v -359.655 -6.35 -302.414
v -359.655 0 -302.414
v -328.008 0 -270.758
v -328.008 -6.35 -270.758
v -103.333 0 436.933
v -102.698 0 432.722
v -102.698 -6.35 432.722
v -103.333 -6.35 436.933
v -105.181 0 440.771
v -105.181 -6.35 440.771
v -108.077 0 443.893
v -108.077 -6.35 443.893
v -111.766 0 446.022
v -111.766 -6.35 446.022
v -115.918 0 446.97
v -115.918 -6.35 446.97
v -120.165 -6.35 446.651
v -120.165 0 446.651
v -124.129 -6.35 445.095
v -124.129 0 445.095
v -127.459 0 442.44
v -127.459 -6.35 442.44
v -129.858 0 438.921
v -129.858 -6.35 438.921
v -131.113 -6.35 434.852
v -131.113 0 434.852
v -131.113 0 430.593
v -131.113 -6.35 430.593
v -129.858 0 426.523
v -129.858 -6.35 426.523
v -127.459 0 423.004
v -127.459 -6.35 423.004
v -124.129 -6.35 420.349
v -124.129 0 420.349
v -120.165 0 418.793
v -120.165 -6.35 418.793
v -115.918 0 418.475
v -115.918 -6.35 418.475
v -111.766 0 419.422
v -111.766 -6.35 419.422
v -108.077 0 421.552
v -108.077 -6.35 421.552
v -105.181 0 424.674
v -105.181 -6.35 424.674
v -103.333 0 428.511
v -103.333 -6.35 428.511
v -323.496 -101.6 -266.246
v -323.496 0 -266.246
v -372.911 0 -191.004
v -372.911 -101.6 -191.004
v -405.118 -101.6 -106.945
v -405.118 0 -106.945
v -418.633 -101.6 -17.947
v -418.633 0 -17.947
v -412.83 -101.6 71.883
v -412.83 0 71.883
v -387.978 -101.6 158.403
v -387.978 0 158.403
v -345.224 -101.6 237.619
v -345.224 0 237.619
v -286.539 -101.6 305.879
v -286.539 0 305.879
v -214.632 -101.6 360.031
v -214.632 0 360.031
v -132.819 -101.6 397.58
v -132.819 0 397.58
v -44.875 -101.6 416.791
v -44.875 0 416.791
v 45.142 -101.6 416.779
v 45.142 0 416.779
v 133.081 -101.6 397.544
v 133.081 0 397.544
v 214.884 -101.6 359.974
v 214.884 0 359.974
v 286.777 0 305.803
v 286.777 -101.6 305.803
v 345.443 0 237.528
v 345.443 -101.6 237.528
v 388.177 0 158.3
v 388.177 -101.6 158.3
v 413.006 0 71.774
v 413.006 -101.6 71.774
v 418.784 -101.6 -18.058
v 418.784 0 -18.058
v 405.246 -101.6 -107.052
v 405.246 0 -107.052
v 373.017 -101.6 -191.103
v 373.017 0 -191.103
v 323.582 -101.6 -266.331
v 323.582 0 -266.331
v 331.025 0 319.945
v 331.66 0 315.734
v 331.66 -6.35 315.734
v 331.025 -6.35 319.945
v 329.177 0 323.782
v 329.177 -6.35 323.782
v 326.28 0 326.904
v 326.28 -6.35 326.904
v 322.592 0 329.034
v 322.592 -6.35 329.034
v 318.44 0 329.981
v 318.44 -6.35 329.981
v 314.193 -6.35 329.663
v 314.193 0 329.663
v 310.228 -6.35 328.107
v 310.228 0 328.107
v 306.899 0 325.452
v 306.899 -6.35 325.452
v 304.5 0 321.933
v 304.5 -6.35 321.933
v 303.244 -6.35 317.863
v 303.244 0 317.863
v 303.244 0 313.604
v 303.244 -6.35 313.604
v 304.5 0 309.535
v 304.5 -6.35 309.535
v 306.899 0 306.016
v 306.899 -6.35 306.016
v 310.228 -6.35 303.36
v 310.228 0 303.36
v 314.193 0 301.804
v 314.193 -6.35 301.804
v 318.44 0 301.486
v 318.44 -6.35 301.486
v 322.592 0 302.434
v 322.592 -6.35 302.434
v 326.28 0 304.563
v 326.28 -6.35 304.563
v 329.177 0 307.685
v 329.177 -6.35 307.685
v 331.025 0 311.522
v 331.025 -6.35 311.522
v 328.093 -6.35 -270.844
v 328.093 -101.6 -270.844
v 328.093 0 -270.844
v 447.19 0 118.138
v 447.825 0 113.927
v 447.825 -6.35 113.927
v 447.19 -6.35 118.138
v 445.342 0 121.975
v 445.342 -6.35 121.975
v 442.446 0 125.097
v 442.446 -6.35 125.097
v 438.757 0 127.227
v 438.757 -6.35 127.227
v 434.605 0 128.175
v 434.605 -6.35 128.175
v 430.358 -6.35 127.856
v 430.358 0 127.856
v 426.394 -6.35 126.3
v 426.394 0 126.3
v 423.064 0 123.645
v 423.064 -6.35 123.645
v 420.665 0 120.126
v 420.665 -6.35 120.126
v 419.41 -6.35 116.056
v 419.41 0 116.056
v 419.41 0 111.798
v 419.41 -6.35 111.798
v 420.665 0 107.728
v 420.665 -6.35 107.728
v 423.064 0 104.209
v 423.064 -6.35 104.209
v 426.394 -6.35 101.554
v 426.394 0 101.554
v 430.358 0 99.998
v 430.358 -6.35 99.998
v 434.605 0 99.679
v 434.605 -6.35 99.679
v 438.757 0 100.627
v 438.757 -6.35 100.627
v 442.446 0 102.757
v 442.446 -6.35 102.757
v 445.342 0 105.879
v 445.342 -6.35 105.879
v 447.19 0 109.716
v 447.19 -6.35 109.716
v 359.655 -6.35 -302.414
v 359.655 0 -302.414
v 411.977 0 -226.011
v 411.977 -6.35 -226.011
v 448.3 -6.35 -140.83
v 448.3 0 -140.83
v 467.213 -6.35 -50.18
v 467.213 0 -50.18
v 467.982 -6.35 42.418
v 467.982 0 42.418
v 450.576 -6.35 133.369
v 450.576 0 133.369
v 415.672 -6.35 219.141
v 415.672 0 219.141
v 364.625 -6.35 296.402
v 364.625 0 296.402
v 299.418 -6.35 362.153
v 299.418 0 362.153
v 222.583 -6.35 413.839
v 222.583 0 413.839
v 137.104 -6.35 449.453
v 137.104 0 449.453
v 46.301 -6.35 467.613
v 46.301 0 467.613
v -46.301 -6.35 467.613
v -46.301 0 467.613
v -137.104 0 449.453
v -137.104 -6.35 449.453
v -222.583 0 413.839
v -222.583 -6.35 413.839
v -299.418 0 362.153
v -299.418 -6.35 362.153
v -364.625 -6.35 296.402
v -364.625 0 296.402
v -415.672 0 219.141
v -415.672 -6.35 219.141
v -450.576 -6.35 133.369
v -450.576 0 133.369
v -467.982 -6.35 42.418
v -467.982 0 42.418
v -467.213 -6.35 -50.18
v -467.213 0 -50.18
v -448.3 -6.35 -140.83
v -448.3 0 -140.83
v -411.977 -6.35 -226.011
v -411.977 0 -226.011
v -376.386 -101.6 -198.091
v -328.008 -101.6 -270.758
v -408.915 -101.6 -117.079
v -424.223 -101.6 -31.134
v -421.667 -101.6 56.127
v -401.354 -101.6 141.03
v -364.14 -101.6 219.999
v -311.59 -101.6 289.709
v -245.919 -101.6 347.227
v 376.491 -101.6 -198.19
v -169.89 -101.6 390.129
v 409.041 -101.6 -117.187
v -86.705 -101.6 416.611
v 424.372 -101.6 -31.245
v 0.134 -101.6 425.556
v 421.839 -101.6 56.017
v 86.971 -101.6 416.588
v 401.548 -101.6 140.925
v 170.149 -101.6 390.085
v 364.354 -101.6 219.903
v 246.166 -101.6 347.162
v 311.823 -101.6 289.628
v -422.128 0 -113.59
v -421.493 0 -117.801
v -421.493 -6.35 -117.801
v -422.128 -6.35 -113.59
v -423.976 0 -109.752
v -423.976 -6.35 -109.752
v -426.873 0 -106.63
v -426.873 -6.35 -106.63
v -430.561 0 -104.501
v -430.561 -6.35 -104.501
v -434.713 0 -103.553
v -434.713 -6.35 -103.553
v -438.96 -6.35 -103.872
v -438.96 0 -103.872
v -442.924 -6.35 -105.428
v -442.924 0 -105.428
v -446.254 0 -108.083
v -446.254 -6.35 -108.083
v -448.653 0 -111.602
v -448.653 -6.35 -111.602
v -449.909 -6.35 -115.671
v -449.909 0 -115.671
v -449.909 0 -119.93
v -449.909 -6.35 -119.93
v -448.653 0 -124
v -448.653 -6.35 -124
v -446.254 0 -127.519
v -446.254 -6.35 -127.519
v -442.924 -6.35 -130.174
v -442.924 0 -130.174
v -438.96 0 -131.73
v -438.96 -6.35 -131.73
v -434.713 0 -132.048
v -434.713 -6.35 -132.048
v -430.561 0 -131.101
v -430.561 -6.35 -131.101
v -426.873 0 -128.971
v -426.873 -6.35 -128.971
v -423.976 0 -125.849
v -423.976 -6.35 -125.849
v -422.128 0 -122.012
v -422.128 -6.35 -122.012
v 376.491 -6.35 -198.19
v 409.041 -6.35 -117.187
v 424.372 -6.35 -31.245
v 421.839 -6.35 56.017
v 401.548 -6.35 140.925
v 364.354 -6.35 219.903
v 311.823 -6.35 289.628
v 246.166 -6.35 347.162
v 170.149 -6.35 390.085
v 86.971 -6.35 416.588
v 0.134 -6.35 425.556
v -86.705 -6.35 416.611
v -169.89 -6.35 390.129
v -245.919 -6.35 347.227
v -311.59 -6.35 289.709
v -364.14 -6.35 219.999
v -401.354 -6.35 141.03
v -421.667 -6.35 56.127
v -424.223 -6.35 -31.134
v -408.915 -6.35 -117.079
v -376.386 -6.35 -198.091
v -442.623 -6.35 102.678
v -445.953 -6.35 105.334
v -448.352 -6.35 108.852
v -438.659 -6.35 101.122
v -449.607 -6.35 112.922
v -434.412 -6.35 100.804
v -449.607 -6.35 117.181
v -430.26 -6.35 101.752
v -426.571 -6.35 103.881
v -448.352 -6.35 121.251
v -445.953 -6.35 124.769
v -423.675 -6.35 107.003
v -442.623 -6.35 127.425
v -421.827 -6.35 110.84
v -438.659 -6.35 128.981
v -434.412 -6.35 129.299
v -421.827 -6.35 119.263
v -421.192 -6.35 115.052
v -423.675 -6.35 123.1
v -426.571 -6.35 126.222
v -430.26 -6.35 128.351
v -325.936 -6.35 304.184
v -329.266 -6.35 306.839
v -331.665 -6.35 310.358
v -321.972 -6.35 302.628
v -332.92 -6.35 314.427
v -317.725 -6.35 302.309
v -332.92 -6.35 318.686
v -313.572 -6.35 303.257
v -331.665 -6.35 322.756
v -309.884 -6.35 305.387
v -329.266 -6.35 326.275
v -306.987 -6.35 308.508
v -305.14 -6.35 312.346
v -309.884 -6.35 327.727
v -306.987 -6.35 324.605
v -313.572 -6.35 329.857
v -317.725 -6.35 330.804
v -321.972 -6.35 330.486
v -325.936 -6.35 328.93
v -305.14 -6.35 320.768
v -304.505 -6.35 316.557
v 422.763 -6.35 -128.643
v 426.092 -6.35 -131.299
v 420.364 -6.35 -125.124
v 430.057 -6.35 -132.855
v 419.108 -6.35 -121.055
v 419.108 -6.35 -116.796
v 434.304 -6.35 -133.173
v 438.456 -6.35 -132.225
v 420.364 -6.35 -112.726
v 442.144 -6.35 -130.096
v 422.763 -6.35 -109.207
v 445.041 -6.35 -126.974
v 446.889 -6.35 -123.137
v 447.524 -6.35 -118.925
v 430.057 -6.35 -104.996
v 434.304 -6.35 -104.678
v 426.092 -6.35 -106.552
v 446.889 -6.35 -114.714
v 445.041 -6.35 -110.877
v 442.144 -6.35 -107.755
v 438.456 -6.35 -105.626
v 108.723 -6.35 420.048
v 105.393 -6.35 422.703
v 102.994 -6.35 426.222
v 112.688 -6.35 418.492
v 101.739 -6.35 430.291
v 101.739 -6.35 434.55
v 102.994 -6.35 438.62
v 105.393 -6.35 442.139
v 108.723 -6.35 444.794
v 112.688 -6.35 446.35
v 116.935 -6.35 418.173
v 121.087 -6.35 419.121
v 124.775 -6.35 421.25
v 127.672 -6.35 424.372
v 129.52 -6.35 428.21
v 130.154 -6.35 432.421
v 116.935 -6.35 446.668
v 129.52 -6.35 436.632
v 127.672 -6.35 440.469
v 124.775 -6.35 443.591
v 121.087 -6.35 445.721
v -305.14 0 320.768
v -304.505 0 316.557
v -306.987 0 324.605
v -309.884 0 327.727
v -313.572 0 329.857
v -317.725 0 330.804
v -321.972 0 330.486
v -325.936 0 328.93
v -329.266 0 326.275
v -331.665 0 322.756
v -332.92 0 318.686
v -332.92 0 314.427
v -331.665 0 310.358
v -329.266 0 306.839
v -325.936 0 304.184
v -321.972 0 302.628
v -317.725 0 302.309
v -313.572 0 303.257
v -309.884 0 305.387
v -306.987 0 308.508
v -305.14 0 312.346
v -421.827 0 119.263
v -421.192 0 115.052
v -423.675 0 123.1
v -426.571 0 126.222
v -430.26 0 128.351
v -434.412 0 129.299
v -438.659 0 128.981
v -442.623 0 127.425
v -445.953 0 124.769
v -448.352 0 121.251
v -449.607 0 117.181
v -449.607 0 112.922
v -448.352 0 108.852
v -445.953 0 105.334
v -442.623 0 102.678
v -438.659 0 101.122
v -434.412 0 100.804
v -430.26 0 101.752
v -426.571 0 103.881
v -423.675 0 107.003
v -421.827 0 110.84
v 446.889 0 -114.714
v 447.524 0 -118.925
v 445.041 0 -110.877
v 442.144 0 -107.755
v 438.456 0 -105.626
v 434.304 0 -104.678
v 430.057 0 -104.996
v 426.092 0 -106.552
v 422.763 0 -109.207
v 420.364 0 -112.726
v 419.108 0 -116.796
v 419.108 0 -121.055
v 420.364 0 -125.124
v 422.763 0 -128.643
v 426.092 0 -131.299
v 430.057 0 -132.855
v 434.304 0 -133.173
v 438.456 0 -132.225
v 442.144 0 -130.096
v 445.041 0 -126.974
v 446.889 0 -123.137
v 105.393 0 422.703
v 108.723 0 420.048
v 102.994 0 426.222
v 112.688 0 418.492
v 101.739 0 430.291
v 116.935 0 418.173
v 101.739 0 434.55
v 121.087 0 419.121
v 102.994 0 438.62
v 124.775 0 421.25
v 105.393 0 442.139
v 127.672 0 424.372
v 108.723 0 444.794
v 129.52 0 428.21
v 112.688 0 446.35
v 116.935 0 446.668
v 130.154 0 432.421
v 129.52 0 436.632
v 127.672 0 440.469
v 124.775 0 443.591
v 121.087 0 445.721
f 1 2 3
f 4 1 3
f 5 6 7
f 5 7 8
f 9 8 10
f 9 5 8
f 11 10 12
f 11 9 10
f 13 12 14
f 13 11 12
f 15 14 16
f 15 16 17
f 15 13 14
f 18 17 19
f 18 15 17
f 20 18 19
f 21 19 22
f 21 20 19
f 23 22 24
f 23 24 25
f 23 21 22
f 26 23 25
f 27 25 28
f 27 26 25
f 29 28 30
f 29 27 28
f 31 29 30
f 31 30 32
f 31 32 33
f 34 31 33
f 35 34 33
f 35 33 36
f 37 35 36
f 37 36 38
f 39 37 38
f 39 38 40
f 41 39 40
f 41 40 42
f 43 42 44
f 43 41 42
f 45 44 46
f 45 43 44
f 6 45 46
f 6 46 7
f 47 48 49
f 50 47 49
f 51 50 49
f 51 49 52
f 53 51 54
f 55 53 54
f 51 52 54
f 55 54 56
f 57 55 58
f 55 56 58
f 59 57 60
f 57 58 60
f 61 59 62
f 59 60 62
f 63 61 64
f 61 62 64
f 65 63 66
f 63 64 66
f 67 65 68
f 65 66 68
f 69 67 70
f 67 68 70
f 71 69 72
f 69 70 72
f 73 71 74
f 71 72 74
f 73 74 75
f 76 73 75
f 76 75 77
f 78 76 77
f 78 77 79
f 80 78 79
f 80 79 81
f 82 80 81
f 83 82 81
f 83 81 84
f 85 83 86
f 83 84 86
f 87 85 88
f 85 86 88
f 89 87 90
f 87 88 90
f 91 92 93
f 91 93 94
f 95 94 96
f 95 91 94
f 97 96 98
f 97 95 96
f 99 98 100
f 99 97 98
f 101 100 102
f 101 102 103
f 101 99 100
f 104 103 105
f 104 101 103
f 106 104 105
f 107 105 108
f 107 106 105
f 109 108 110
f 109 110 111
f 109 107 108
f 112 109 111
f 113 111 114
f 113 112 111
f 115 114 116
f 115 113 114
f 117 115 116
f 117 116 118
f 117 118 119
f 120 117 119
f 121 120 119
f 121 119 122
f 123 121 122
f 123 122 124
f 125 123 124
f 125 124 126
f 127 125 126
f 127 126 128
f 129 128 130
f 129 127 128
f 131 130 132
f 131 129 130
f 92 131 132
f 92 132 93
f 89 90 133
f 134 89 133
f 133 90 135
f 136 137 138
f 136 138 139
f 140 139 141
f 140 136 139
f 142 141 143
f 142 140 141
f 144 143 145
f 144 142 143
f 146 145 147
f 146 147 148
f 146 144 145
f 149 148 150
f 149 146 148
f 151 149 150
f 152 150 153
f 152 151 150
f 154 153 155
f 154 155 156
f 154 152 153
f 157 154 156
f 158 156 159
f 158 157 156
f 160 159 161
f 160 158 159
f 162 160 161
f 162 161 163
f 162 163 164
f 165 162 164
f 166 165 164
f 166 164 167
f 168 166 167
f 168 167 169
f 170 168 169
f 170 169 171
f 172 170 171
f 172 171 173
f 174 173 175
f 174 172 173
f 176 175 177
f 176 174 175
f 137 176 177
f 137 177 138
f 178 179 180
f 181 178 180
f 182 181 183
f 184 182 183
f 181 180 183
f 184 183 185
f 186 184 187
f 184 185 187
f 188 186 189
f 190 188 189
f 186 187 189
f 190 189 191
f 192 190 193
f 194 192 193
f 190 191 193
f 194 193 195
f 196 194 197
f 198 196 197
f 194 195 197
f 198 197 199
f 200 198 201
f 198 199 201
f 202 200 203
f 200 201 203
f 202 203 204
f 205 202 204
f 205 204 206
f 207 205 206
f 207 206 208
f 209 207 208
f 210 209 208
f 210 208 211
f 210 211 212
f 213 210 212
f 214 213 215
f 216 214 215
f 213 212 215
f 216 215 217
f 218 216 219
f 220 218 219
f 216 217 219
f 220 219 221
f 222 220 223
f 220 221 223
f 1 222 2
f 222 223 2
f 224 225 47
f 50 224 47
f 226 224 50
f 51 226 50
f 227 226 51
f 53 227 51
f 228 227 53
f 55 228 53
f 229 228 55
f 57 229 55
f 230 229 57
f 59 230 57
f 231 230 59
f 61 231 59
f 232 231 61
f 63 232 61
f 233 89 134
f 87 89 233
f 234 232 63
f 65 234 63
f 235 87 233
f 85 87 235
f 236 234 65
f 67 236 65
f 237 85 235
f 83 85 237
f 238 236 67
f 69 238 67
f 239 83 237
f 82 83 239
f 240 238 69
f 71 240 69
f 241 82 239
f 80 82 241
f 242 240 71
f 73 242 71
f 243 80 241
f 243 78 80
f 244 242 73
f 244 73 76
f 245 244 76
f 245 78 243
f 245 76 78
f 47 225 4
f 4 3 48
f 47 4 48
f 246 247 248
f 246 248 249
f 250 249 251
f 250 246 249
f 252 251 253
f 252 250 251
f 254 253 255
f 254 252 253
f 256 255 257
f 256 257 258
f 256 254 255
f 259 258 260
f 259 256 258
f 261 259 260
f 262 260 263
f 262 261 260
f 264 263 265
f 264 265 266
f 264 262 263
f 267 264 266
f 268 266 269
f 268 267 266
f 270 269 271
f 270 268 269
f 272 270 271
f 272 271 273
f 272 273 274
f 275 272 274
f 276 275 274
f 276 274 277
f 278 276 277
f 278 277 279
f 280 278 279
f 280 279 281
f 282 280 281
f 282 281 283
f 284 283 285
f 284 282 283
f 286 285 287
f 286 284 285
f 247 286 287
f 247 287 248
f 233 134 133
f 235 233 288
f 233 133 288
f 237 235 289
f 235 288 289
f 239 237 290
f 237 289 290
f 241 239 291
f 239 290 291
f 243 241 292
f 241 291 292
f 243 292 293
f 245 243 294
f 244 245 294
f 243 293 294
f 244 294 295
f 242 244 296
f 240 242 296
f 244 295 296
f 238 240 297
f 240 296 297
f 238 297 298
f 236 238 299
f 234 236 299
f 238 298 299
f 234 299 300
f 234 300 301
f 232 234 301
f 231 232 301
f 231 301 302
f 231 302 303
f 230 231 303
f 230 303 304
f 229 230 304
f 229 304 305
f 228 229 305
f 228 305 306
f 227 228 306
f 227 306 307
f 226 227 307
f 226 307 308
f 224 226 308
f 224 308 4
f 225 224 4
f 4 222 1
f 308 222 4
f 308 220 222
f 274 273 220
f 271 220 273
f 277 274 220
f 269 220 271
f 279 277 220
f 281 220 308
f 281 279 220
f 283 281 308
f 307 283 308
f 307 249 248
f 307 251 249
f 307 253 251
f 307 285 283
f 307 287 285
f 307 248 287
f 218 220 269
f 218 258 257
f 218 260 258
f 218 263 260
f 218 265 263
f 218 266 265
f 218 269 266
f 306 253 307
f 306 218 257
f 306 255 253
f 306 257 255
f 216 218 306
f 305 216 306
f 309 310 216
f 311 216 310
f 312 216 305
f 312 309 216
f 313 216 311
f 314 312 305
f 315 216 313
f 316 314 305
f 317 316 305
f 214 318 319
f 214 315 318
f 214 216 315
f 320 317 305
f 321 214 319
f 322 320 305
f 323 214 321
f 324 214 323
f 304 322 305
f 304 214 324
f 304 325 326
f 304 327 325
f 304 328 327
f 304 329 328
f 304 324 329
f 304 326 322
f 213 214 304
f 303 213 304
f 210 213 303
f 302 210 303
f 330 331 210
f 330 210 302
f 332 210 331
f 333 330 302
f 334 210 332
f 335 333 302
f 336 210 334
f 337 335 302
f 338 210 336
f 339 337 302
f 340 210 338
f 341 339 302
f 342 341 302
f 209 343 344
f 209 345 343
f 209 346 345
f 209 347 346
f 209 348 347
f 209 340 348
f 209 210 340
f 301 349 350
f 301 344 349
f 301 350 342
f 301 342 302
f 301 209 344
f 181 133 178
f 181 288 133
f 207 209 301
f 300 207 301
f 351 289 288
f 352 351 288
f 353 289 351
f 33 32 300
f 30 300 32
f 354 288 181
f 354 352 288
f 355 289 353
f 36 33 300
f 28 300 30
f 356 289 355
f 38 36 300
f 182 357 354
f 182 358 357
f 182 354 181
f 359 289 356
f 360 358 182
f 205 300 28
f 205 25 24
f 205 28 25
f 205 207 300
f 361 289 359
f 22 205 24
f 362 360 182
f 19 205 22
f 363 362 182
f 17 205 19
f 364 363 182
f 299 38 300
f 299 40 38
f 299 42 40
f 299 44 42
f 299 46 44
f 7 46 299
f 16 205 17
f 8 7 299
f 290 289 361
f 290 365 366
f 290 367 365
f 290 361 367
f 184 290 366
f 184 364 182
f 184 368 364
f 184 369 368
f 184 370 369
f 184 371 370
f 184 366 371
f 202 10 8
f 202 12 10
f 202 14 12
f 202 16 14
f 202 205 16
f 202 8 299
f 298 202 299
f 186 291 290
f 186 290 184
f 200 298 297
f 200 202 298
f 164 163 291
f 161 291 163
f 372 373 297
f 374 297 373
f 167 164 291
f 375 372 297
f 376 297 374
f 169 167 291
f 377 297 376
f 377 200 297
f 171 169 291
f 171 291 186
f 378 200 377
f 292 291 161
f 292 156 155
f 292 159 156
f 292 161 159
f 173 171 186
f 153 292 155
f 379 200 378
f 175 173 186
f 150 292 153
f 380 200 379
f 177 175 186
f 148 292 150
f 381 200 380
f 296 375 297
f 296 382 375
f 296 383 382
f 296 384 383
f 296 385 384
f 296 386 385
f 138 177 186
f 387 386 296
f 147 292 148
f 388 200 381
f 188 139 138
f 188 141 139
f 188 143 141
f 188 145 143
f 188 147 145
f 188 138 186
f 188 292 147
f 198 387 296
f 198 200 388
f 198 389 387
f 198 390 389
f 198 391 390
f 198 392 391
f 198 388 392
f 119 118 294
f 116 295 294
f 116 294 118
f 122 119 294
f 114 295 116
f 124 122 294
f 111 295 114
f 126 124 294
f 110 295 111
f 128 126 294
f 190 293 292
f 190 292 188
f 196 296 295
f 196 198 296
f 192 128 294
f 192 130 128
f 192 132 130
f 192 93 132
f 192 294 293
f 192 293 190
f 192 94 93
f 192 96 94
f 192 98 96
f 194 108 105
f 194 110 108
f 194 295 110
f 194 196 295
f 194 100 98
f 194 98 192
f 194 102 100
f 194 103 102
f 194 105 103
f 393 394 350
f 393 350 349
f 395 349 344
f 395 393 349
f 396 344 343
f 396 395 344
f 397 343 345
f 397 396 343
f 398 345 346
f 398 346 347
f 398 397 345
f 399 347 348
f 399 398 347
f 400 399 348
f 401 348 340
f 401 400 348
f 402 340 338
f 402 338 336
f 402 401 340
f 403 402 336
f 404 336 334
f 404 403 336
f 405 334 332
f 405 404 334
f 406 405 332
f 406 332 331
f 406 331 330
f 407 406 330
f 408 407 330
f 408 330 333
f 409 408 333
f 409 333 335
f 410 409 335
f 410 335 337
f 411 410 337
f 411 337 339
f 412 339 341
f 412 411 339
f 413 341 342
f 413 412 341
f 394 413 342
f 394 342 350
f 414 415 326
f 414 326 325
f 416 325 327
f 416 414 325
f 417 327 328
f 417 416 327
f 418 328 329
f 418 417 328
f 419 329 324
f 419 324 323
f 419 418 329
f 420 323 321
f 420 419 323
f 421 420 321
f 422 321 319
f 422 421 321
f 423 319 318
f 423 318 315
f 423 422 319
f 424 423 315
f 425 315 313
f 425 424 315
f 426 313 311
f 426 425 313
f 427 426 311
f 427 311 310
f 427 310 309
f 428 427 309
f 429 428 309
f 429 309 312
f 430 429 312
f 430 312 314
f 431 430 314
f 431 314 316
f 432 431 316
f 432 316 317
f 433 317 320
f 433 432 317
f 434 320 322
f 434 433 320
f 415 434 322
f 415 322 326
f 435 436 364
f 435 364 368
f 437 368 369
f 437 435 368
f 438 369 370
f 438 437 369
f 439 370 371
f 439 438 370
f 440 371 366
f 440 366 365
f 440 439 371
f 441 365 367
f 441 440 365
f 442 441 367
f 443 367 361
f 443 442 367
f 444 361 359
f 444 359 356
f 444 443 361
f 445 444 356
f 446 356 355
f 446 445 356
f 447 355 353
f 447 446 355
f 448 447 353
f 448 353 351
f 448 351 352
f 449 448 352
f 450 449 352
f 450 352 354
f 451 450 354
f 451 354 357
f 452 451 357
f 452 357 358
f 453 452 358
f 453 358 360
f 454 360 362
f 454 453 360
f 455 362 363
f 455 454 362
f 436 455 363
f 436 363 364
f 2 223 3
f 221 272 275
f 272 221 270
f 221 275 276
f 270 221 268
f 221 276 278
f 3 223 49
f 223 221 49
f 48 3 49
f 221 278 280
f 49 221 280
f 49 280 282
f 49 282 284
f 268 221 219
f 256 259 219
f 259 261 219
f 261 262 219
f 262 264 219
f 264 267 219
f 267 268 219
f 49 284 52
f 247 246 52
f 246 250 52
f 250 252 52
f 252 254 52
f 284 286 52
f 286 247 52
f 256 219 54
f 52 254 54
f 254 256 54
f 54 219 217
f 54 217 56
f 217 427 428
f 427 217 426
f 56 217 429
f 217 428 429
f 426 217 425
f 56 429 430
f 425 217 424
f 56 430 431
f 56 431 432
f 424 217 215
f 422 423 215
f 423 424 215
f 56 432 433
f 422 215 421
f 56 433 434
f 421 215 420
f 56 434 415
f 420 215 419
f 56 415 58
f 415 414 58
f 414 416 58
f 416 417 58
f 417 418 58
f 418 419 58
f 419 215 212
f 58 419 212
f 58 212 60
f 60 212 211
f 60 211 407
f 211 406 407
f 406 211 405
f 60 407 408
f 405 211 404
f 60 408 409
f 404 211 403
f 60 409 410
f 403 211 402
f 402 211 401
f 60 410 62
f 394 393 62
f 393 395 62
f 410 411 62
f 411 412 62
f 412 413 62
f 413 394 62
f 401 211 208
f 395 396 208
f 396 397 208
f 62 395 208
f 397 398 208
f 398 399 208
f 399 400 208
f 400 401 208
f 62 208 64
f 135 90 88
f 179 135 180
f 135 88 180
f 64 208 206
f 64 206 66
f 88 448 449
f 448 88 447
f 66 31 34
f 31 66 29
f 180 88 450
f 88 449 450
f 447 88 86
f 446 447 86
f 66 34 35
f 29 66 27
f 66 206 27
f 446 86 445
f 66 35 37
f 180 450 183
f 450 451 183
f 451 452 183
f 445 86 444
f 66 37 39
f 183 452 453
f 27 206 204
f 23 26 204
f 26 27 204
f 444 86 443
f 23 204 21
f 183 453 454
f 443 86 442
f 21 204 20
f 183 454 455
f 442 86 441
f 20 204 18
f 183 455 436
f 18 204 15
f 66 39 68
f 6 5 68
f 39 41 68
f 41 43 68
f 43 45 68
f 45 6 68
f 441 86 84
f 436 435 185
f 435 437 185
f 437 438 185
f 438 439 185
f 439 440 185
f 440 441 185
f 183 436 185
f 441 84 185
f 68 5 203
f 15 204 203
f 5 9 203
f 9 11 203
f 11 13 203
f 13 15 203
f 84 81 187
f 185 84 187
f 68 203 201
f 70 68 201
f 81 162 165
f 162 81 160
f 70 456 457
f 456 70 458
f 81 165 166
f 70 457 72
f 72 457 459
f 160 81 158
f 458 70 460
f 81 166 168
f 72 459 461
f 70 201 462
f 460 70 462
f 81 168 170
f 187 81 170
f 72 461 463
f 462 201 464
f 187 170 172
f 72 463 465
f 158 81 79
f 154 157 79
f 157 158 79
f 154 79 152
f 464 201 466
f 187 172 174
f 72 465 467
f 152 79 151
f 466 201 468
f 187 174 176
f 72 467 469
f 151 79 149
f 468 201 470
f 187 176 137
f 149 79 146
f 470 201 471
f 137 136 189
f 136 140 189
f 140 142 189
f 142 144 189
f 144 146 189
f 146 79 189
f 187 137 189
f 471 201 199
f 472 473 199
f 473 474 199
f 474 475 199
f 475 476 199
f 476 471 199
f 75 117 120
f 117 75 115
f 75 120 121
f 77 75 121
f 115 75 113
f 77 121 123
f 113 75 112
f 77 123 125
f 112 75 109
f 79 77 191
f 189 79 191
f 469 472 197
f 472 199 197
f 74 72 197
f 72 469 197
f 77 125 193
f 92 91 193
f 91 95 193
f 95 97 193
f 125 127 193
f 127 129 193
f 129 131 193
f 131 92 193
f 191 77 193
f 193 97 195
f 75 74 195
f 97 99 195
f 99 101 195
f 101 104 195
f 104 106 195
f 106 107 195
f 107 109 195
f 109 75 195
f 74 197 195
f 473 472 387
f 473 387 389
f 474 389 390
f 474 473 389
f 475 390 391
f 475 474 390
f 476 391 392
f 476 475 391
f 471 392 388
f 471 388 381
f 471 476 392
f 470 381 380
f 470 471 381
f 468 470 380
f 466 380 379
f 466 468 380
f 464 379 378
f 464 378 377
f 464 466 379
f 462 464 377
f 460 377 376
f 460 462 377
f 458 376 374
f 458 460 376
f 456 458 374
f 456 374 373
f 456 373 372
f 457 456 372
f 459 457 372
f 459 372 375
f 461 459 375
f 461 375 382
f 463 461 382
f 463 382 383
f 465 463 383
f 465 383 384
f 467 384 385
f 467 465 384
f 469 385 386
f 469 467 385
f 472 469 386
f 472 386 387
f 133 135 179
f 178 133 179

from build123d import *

# Parameters (mm, degrees)
F0_R     = 14.2875
F1_DEPTH = 6.35
F2_DEPTH = 101.6


with BuildPart() as f1:
    # F0 (on Front) → F1 (new body)
    with BuildSketch(Plane.XZ):
        with BuildLine():
            Line((328.093377, -270.84429), (359.655066, -302.414026))
            ThreePointArc((359.655066, -302.414026), (0, 469.9), (-359.655066, -302.414026))
            Line((-359.655066, -302.414026), (-328.00754, -270.758432))
            ThreePointArc((-328.00754, -270.758432), (0.134045, 425.555623), (328.093377, -270.84429))
        make_face()
        with Locations((-435.780706, -117.80084)):
            Circle(F0_R, mode=Mode.SUBTRACT)
        with Locations((433.236139, -118.925363)):
            Circle(F0_R, mode=Mode.SUBTRACT)
        with Locations((-435.479391, 115.051521)):
            Circle(F0_R, mode=Mode.SUBTRACT)
        with Locations((-318.792264, 316.556925)):
            Circle(F0_R, mode=Mode.SUBTRACT)
        with Locations((-116.985546, 432.722159)):
            Circle(F0_R, mode=Mode.SUBTRACT)
        with Locations((433.537454, 113.926999)):
            Circle(F0_R, mode=Mode.SUBTRACT)
        with Locations((115.866816, 432.420844)):
            Circle(F0_R, mode=Mode.SUBTRACT)
        with Locations((317.372219, 315.733717)):
            Circle(F0_R, mode=Mode.SUBTRACT)
    extrude(amount=F1_DEPTH)

    # F0 (on Front) → F2 (join)
    with BuildSketch(Plane.XZ):
        with BuildLine():
            Line((323.581604, -266.331367), (328.093377, -270.84429))
            ThreePointArc((328.093377, -270.84429), (0.134045, 425.555623), (-328.00754, -270.758432))
            Line((-328.00754, -270.758432), (-323.495767, -266.245508))
            ThreePointArc((-323.495767, -266.245508), (0.133875, 419.208866), (323.581604, -266.331367))
        make_face()
    extrude(amount=F2_DEPTH)


solid = f1.part
